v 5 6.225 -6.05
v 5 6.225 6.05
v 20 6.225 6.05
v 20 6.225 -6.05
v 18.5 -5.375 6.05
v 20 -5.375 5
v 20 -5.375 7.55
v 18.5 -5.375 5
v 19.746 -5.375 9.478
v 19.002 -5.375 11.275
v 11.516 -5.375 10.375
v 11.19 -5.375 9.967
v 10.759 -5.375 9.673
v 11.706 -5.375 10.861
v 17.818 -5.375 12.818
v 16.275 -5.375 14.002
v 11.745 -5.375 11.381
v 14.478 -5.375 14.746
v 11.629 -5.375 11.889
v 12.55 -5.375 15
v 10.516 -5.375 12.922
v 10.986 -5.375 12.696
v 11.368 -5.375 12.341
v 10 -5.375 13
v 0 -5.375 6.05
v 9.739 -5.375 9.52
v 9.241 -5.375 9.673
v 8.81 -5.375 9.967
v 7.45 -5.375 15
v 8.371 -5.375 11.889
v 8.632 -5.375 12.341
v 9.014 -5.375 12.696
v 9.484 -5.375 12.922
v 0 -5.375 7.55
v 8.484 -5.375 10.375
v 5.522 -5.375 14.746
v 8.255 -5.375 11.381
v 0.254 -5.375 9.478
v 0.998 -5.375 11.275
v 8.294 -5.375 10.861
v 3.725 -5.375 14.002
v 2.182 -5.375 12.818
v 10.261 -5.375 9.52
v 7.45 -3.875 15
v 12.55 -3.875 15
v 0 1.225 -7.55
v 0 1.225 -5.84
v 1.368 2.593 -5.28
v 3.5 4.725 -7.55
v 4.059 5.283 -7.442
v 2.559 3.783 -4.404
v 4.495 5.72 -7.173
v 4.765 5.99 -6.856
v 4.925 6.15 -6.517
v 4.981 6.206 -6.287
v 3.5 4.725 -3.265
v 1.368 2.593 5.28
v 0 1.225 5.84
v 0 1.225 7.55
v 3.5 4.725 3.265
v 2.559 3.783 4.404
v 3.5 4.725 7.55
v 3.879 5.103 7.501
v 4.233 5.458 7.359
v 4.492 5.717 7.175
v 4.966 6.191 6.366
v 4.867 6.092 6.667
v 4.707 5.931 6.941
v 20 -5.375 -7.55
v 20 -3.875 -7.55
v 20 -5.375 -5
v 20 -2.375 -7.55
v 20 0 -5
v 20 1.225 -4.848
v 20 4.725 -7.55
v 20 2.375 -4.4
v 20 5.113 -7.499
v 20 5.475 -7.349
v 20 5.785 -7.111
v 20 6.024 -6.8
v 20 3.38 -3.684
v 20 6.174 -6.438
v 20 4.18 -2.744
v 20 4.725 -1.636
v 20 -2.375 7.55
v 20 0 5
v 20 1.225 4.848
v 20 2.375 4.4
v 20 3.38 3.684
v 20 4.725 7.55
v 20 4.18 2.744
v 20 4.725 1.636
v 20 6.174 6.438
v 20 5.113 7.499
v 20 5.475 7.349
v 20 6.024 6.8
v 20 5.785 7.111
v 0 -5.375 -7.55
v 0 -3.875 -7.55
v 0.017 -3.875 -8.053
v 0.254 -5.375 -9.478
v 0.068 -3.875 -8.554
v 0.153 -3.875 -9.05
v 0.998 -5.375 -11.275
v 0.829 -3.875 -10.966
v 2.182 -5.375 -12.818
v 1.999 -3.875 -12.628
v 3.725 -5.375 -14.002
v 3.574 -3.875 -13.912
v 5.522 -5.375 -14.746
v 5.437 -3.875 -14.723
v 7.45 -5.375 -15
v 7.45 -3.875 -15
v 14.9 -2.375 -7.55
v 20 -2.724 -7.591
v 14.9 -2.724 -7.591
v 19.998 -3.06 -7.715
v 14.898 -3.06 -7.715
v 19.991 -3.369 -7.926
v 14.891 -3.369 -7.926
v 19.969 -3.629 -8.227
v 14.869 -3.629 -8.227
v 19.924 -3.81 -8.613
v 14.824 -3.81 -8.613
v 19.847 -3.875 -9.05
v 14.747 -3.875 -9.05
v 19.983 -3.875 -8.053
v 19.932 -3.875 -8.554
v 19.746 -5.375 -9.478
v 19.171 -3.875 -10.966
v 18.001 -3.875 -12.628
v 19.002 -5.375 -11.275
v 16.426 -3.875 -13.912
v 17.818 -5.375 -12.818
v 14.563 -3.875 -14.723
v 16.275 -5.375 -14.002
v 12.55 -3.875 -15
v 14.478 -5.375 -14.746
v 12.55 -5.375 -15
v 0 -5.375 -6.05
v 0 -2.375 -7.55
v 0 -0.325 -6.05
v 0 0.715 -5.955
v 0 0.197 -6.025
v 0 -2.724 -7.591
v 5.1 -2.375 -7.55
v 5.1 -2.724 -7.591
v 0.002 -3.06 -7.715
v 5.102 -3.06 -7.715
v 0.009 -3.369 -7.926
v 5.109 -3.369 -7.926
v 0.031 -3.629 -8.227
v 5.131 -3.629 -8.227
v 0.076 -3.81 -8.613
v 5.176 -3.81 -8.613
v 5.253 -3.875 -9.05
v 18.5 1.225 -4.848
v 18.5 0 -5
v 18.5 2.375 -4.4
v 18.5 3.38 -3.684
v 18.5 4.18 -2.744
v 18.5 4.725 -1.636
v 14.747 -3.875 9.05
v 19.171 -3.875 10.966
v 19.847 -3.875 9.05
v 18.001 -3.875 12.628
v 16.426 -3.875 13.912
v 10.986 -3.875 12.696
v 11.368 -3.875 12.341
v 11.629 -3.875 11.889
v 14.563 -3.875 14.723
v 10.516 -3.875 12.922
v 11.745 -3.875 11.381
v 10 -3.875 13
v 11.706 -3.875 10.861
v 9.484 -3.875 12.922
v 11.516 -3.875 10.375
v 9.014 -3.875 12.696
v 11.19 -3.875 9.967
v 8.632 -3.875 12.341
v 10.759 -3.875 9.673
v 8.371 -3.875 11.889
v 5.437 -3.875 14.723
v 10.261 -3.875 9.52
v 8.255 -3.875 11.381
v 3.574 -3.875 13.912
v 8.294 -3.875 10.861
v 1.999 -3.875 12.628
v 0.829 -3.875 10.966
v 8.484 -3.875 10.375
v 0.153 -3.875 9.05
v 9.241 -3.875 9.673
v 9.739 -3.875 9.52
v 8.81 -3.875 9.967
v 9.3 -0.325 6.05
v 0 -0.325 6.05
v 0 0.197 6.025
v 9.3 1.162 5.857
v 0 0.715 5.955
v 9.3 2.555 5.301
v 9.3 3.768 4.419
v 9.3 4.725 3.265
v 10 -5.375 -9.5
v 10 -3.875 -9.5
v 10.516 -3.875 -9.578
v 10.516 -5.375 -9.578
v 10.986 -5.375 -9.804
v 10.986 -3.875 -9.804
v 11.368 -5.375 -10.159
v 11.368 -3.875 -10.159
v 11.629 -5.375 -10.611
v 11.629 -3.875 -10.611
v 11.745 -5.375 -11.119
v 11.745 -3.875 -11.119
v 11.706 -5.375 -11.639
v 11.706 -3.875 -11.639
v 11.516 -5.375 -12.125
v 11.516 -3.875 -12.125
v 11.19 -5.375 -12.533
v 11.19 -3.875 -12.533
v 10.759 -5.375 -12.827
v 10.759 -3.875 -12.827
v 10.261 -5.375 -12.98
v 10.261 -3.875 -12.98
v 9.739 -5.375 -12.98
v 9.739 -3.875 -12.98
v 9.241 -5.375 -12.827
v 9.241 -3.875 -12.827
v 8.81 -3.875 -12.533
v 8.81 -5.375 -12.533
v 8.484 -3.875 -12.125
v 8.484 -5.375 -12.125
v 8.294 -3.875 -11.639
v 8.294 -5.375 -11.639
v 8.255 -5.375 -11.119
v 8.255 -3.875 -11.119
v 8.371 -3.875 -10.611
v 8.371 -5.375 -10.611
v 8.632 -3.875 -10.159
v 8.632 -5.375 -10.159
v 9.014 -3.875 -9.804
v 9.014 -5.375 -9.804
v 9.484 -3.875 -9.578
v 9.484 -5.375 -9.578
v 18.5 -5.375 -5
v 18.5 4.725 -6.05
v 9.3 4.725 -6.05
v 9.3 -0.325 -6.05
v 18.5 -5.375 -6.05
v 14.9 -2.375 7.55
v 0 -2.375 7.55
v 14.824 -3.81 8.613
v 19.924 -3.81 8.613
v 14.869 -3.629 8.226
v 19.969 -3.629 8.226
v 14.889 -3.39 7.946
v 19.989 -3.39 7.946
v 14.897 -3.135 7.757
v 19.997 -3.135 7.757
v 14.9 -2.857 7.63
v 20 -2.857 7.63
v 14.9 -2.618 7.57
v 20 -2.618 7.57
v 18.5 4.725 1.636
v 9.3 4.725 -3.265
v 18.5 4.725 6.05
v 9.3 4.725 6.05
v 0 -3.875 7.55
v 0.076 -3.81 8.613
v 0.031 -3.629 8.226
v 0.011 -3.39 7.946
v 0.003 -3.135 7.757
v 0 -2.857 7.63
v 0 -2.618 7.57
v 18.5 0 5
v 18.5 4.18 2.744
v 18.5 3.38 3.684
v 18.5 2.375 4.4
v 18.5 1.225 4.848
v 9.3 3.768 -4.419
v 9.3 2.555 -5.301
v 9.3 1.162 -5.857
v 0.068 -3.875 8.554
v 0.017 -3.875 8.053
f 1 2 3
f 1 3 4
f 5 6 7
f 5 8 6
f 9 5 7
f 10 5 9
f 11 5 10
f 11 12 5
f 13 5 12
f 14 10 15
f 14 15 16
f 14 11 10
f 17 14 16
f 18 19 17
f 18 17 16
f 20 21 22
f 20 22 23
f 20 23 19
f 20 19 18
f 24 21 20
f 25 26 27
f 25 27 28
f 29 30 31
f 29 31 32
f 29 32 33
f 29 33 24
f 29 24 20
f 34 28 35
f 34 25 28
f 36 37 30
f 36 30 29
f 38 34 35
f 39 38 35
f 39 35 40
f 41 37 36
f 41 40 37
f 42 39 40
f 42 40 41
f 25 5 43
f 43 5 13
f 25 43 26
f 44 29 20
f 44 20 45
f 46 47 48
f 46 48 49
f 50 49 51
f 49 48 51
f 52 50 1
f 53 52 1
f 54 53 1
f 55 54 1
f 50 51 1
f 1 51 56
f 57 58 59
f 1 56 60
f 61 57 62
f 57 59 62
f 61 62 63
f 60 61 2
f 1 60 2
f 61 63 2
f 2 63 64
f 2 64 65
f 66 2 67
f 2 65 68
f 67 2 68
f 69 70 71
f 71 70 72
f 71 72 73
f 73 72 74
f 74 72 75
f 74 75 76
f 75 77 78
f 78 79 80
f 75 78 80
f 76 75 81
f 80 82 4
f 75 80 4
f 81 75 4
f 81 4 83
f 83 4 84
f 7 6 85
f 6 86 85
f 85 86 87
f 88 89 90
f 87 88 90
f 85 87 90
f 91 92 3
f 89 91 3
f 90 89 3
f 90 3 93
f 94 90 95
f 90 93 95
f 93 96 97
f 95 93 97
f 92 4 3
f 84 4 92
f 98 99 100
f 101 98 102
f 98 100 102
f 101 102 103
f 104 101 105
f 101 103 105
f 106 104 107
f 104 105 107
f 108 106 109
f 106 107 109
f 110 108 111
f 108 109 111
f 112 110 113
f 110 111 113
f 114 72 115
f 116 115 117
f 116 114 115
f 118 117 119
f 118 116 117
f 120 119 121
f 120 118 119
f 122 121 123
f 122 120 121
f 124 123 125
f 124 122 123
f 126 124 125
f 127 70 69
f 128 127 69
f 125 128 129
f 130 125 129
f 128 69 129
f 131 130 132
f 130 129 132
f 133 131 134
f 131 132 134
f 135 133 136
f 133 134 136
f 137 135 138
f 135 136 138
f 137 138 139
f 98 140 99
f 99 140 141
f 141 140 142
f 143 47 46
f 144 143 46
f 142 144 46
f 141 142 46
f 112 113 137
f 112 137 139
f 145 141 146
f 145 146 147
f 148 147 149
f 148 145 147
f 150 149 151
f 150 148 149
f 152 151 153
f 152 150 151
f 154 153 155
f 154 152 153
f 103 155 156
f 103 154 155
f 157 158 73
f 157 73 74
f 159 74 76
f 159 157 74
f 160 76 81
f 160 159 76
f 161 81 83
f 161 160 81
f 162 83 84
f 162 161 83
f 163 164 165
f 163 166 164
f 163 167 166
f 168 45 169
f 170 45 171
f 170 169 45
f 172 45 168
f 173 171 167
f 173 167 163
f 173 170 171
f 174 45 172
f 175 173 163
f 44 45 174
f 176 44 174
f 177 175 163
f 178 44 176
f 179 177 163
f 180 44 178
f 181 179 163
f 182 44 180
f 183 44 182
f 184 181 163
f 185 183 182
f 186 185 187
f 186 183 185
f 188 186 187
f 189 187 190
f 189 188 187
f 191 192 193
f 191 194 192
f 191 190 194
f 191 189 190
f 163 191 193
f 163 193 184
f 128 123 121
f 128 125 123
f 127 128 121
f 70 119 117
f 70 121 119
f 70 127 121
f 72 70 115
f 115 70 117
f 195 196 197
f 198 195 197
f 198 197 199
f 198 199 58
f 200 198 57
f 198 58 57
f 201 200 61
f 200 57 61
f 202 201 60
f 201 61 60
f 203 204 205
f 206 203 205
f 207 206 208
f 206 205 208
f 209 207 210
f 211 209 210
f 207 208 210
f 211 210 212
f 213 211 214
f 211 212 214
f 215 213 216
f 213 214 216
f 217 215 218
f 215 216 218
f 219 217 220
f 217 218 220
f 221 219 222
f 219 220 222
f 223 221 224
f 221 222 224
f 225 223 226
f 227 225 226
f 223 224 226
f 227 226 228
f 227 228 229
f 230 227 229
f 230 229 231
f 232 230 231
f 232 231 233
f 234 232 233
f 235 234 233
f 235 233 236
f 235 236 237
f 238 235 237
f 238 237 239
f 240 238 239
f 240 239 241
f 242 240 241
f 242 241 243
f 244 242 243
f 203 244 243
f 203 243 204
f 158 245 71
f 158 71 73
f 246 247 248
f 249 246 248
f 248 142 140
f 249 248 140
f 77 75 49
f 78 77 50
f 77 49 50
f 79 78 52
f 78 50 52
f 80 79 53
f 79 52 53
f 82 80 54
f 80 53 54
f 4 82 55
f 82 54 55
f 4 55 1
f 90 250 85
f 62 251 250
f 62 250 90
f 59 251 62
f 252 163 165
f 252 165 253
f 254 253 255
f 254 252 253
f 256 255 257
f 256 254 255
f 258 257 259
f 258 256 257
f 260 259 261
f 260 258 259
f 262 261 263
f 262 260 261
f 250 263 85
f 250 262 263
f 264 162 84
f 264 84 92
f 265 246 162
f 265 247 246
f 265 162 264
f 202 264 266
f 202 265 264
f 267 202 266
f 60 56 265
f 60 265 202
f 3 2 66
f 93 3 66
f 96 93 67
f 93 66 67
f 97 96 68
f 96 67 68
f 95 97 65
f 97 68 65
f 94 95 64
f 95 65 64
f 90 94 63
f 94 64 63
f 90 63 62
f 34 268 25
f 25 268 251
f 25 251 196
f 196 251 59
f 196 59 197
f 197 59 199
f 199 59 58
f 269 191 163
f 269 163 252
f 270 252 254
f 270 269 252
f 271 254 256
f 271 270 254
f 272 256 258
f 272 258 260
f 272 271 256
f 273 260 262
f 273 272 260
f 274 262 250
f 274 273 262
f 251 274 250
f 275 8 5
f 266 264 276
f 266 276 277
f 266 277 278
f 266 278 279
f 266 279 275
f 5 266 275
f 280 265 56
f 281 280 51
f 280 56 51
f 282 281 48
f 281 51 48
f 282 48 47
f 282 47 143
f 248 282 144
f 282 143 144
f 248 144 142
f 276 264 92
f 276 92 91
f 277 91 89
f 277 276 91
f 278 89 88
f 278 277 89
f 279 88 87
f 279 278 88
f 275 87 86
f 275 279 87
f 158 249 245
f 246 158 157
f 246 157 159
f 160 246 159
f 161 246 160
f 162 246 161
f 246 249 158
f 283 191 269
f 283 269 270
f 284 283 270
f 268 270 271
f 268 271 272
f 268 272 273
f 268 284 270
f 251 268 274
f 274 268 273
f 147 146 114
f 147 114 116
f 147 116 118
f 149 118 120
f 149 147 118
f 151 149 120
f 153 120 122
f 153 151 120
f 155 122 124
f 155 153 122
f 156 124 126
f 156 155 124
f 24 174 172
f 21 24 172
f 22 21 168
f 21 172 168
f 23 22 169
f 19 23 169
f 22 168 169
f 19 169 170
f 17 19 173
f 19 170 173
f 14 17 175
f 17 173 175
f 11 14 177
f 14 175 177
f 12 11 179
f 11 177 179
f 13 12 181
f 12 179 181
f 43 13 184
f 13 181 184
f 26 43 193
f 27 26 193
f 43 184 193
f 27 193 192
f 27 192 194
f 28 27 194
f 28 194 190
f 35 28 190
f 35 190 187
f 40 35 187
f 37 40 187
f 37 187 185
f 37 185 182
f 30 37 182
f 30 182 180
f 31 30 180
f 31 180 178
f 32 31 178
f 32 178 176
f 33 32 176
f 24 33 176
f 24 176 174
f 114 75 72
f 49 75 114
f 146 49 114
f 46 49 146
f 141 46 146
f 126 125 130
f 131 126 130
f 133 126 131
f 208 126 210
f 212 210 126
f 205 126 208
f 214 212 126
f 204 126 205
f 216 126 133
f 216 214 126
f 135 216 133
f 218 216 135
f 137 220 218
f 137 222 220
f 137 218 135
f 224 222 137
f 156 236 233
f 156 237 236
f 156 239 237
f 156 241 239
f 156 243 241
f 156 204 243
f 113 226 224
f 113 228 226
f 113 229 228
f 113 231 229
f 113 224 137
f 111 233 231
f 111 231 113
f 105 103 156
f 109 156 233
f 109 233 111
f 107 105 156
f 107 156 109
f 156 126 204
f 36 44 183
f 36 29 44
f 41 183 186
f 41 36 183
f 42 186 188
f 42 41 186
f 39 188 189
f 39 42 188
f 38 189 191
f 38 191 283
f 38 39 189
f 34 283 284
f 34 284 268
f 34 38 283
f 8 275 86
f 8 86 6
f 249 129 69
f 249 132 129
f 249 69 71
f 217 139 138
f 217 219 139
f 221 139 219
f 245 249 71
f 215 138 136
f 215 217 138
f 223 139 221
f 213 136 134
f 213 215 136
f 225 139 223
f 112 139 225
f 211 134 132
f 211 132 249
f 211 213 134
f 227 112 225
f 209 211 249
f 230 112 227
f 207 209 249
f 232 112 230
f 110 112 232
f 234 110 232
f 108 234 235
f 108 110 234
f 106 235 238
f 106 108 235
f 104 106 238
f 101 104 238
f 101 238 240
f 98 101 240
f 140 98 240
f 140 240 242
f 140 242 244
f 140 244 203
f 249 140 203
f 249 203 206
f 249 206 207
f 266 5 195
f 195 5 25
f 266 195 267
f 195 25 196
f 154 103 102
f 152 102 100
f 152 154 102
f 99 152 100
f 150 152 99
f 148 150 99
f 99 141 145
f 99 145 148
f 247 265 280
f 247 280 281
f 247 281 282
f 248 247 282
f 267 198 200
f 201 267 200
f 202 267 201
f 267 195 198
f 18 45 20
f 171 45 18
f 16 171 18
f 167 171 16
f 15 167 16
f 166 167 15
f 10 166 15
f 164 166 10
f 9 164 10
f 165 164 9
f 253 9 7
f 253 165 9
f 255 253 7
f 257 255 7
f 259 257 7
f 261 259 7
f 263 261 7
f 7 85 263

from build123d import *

# Parameters (mm, degrees)
BOSS_EXTRUDE1_DEPTH = 9.3
BOSS_EXTRUDE2_DEPTH = 9.2
BOSS_EXTRUDE3_DEPTH = 1.5
SKETCH4_R           = 1.75
CUT_EXTRUDE4_DEPTH  = 2
FILLET4_R           = 7.45
FILLET5_R           = 1.5
CHAMFER2_START      = -5
CHAMFER2_OUTLINE_W  = 10
CHAMFER2_OUTLINE_H  = 15.1
CHAMFER2_DEPTH      = 4.134035023


with BuildPart() as part:
    # Sketch3 → Boss-Extrude1 (new body)
    with BuildSketch(Plane(origin=(0, 0, 0), x_dir=(0, 0, -1), z_dir=(1, 0, 0))):
        with BuildLine():
            Line((-6.05, -5.375339764), (-6.05, -0.325229596))
            ThreePointArc((-6.05, -0.325229596), (-5.30143663, 2.555003374), (-3.26460533, 4.724659415))
            Line((-3.26460533, 4.724659415), (3.26460533, 4.724659415))
            ThreePointArc((3.26460533, 4.724659415), (5.30143663, 2.555003374), (6.05, -0.325229596))
            Line((6.05, -0.325229596), (6.05, -5.375339764))
            Line((6.05, -5.375339764), (15, -5.375339764))
            Line((15, -5.375339764), (15, -3.875339764))
            Line((15, -3.875339764), (7.55, -3.875339764))
            Line((7.55, -3.875339764), (7.55, 6.224659415))
            Line((7.55, 6.224659415), (-7.55, 6.224659415))
            Line((-7.55, 6.224659415), (-7.55, -3.875339764))
            Line((-7.55, -3.875339764), (-15, -3.875339764))
            Line((-15, -3.875339764), (-15, -5.375339764))
            Line((-15, -5.375339764), (-6.05, -5.375339764))
        make_face()
    extrude(amount=BOSS_EXTRUDE1_DEPTH)

    # Sketch9 → Boss-Extrude2 (add)
    with BuildSketch(Plane(origin=(9.3, 0, 0), x_dir=(0, 0, -1), z_dir=(1, 0, 0))):
        Polygon((7.55, -3.875339764), (7.55, 6.224659415), (-7.55, 6.224659415), (-7.55, -3.875339764), (-15, -3.875339764), (-15, -5.375339764), (-6.05, -5.375339764), (-6.05, 4.724659415), (6.05, 4.724659415), (6.05, -5.375339764), (15, -5.375339764), (15, -3.875339764), align=None)
    extrude(amount=BOSS_EXTRUDE2_DEPTH)

    # Sketch11 → Boss-Extrude3 (add)
    with BuildSketch(Plane(origin=(18.5, 0, 0), x_dir=(0, 0, -1), z_dir=(1, 0, 0))):
        with BuildLine():
            Line((-5, 0), (-5, -5.375339764))
            Line((-5, -5.375339764), (-15, -5.375339764))
            Line((-15, -5.375339764), (-15, -3.875339764))
            Line((-15, -3.875339764), (-7.55, -3.875339764))
            Line((-7.55, -3.875339764), (-7.55, 6.224659415))
            Line((-7.55, 6.224659415), (7.55, 6.224659415))
            Line((7.55, 6.224659415), (7.55, -3.875339764))
            Line((7.55, -3.875339764), (15, -3.875339764))
            Line((15, -3.875339764), (15, -5.375339764))
            Line((15, -5.375339764), (5, -5.375339764))
            Line((5, -5.375339764), (5, 0))
            ThreePointArc((5, 0), (4.07318529, 2.899855444), (1.636335361, 4.724659415))
            Line((1.636335361, 4.724659415), (-1.636335361, 4.724659415))
            ThreePointArc((-1.636335361, 4.724659415), (-4.07318529, 2.899855444), (-5, 0))
        make_face()
    extrude(amount=BOSS_EXTRUDE3_DEPTH)

    # Sketch4 → Cut-Extrude4 (cut)
    with BuildSketch(Plane(origin=(0, -3.875339764, 0), x_dir=(1, 0, 0), z_dir=(0, 1, 0))):
        with Locations(Location((10, -11.25, 0), (0, 0, 270))):
            Circle(SKETCH4_R)
        with Locations(Location((10, 11.25, 0), (0, 0, 270))):
            Circle(SKETCH4_R)
    extrude(amount=-CUT_EXTRUDE4_DEPTH, mode=Mode.SUBTRACT)

    # Fillet4
    fillet4_edges = [part.edges().sort_by_distance(p)[0] for p in [
        (0, -4.625339764, -15),
        (20, -4.625339764, -15),
        (20, -4.625339764, 15),
        (0, -4.625339764, 15),
    ]]
    fillet(fillet4_edges, radius=FILLET4_R)

    # Fillet5
    # the kernel refuses this fillet: 1.5 mm, written as the material it adds along each edge
    with BuildSketch(Plane(origin=(-3.75, -3.875339764, 7.55), x_dir=(0, 0, 1), z_dir=(1, 0, 0))) as fillet5_piece_1_section:
        with BuildLine():
            CenterArc((FILLET5_R, -FILLET5_R), FILLET5_R, 90, 90)
            Line((0, -FILLET5_R), (0, 0))
            Line((0, 0), (FILLET5_R, 0))
        make_face()
    fillet5_piece_1 = extrude(amount=27.5, mode=Mode.PRIVATE)
    fillet5_piece_1 = fillet5_piece_1 & Plane(origin=(7.45, -3.875339764, 7.55), x_dir=(-1, 0, 0), z_dir=(0, -1, 0)) * Cylinder(7.45, 61, mode=Mode.PRIVATE)
    add(fillet5_piece_1)
    with BuildSketch(Plane(origin=(-3.75, -3.875339764, 7.55), x_dir=(0, 0, 1), z_dir=(1, 0, 0))) as fillet5_piece_2_section:
        with BuildLine():
            CenterArc((FILLET5_R, -FILLET5_R), FILLET5_R, 90, 90)
            Line((0, -FILLET5_R), (0, 0))
            Line((0, 0), (FILLET5_R, 0))
        make_face()
    fillet5_piece_2 = extrude(amount=27.5, mode=Mode.PRIVATE)
    fillet5_piece_2 = fillet5_piece_2 & Plane(origin=(12.55, -3.875339764, 7.55), x_dir=(0, 0, 1), z_dir=(0, 1, 0)) * Cylinder(7.45, 61, mode=Mode.PRIVATE)
    add(fillet5_piece_2)
    with BuildSketch(Plane(origin=(-3.75, -3.875339764, -7.55), x_dir=(0, 1, 0), z_dir=(1, 0, 0))) as fillet5_piece_3_section:
        with BuildLine():
            CenterArc((FILLET5_R, -FILLET5_R), FILLET5_R, 90, 90)
            Line((0, -FILLET5_R), (0, 0))
            Line((0, 0), (FILLET5_R, 0))
        make_face()
    fillet5_piece_3 = extrude(amount=27.5, mode=Mode.PRIVATE)
    fillet5_piece_3 = fillet5_piece_3 & Plane(origin=(7.45, -3.875339764, -7.55), x_dir=(-1, 0, 0), z_dir=(0, 1, 0)) * Cylinder(7.45, 62, mode=Mode.PRIVATE)
    add(fillet5_piece_3)
    with BuildSketch(Plane(origin=(-3.75, -3.875339764, -7.55), x_dir=(0, 1, 0), z_dir=(1, 0, 0))) as fillet5_piece_4_section:
        with BuildLine():
            CenterArc((FILLET5_R, -FILLET5_R), FILLET5_R, 90, 90)
            Line((0, -FILLET5_R), (0, 0))
            Line((0, 0), (FILLET5_R, 0))
        make_face()
    fillet5_piece_4 = extrude(amount=27.5, mode=Mode.PRIVATE)
    fillet5_piece_4 = fillet5_piece_4 & Plane(origin=(12.55, -3.875339764, -7.55), x_dir=(1, 0, 0), z_dir=(0, -1, 0)) * Cylinder(7.45, 62, mode=Mode.PRIVATE)
    add(fillet5_piece_4)
    # the kernel refuses this fillet: 1.5 mm, written as the material it takes off along each edge
    with BuildSketch(Plane(origin=(-3.75, 6.224659415, 7.55), x_dir=(0, -1, 0), z_dir=(1, 0, 0)), Plane(origin=(-3.75, 6.224659415, -7.55), x_dir=(0, 0, 1), z_dir=(1, 0, 0))) as fillet5_2_piece_1:
        with BuildLine():
            CenterArc((FILLET5_R, FILLET5_R), FILLET5_R, 180, 90)
            Line((0, FILLET5_R), (0, 0))
            Line((0, 0), (FILLET5_R, 0))
        make_face()
    extrude(amount=27.5, mode=Mode.SUBTRACT)

    # Chamfer2: read off the stored shape, not the designer's step
    # Chamfer2 outline → Chamfer2 (cut)
    with BuildSketch(Plane(origin=(0, 0, 0), x_dir=(0.7071067811865474, 0.7071067811865477, 0), z_dir=(0.7071067811865476, -0.7071067811865476, 0)).offset(CHAMFER2_START)):
        with Locations((4, 0)):
            Rectangle(CHAMFER2_OUTLINE_W, CHAMFER2_OUTLINE_H)
    extrude(amount=CHAMFER2_DEPTH, mode=Mode.SUBTRACT)


solid = part.part
